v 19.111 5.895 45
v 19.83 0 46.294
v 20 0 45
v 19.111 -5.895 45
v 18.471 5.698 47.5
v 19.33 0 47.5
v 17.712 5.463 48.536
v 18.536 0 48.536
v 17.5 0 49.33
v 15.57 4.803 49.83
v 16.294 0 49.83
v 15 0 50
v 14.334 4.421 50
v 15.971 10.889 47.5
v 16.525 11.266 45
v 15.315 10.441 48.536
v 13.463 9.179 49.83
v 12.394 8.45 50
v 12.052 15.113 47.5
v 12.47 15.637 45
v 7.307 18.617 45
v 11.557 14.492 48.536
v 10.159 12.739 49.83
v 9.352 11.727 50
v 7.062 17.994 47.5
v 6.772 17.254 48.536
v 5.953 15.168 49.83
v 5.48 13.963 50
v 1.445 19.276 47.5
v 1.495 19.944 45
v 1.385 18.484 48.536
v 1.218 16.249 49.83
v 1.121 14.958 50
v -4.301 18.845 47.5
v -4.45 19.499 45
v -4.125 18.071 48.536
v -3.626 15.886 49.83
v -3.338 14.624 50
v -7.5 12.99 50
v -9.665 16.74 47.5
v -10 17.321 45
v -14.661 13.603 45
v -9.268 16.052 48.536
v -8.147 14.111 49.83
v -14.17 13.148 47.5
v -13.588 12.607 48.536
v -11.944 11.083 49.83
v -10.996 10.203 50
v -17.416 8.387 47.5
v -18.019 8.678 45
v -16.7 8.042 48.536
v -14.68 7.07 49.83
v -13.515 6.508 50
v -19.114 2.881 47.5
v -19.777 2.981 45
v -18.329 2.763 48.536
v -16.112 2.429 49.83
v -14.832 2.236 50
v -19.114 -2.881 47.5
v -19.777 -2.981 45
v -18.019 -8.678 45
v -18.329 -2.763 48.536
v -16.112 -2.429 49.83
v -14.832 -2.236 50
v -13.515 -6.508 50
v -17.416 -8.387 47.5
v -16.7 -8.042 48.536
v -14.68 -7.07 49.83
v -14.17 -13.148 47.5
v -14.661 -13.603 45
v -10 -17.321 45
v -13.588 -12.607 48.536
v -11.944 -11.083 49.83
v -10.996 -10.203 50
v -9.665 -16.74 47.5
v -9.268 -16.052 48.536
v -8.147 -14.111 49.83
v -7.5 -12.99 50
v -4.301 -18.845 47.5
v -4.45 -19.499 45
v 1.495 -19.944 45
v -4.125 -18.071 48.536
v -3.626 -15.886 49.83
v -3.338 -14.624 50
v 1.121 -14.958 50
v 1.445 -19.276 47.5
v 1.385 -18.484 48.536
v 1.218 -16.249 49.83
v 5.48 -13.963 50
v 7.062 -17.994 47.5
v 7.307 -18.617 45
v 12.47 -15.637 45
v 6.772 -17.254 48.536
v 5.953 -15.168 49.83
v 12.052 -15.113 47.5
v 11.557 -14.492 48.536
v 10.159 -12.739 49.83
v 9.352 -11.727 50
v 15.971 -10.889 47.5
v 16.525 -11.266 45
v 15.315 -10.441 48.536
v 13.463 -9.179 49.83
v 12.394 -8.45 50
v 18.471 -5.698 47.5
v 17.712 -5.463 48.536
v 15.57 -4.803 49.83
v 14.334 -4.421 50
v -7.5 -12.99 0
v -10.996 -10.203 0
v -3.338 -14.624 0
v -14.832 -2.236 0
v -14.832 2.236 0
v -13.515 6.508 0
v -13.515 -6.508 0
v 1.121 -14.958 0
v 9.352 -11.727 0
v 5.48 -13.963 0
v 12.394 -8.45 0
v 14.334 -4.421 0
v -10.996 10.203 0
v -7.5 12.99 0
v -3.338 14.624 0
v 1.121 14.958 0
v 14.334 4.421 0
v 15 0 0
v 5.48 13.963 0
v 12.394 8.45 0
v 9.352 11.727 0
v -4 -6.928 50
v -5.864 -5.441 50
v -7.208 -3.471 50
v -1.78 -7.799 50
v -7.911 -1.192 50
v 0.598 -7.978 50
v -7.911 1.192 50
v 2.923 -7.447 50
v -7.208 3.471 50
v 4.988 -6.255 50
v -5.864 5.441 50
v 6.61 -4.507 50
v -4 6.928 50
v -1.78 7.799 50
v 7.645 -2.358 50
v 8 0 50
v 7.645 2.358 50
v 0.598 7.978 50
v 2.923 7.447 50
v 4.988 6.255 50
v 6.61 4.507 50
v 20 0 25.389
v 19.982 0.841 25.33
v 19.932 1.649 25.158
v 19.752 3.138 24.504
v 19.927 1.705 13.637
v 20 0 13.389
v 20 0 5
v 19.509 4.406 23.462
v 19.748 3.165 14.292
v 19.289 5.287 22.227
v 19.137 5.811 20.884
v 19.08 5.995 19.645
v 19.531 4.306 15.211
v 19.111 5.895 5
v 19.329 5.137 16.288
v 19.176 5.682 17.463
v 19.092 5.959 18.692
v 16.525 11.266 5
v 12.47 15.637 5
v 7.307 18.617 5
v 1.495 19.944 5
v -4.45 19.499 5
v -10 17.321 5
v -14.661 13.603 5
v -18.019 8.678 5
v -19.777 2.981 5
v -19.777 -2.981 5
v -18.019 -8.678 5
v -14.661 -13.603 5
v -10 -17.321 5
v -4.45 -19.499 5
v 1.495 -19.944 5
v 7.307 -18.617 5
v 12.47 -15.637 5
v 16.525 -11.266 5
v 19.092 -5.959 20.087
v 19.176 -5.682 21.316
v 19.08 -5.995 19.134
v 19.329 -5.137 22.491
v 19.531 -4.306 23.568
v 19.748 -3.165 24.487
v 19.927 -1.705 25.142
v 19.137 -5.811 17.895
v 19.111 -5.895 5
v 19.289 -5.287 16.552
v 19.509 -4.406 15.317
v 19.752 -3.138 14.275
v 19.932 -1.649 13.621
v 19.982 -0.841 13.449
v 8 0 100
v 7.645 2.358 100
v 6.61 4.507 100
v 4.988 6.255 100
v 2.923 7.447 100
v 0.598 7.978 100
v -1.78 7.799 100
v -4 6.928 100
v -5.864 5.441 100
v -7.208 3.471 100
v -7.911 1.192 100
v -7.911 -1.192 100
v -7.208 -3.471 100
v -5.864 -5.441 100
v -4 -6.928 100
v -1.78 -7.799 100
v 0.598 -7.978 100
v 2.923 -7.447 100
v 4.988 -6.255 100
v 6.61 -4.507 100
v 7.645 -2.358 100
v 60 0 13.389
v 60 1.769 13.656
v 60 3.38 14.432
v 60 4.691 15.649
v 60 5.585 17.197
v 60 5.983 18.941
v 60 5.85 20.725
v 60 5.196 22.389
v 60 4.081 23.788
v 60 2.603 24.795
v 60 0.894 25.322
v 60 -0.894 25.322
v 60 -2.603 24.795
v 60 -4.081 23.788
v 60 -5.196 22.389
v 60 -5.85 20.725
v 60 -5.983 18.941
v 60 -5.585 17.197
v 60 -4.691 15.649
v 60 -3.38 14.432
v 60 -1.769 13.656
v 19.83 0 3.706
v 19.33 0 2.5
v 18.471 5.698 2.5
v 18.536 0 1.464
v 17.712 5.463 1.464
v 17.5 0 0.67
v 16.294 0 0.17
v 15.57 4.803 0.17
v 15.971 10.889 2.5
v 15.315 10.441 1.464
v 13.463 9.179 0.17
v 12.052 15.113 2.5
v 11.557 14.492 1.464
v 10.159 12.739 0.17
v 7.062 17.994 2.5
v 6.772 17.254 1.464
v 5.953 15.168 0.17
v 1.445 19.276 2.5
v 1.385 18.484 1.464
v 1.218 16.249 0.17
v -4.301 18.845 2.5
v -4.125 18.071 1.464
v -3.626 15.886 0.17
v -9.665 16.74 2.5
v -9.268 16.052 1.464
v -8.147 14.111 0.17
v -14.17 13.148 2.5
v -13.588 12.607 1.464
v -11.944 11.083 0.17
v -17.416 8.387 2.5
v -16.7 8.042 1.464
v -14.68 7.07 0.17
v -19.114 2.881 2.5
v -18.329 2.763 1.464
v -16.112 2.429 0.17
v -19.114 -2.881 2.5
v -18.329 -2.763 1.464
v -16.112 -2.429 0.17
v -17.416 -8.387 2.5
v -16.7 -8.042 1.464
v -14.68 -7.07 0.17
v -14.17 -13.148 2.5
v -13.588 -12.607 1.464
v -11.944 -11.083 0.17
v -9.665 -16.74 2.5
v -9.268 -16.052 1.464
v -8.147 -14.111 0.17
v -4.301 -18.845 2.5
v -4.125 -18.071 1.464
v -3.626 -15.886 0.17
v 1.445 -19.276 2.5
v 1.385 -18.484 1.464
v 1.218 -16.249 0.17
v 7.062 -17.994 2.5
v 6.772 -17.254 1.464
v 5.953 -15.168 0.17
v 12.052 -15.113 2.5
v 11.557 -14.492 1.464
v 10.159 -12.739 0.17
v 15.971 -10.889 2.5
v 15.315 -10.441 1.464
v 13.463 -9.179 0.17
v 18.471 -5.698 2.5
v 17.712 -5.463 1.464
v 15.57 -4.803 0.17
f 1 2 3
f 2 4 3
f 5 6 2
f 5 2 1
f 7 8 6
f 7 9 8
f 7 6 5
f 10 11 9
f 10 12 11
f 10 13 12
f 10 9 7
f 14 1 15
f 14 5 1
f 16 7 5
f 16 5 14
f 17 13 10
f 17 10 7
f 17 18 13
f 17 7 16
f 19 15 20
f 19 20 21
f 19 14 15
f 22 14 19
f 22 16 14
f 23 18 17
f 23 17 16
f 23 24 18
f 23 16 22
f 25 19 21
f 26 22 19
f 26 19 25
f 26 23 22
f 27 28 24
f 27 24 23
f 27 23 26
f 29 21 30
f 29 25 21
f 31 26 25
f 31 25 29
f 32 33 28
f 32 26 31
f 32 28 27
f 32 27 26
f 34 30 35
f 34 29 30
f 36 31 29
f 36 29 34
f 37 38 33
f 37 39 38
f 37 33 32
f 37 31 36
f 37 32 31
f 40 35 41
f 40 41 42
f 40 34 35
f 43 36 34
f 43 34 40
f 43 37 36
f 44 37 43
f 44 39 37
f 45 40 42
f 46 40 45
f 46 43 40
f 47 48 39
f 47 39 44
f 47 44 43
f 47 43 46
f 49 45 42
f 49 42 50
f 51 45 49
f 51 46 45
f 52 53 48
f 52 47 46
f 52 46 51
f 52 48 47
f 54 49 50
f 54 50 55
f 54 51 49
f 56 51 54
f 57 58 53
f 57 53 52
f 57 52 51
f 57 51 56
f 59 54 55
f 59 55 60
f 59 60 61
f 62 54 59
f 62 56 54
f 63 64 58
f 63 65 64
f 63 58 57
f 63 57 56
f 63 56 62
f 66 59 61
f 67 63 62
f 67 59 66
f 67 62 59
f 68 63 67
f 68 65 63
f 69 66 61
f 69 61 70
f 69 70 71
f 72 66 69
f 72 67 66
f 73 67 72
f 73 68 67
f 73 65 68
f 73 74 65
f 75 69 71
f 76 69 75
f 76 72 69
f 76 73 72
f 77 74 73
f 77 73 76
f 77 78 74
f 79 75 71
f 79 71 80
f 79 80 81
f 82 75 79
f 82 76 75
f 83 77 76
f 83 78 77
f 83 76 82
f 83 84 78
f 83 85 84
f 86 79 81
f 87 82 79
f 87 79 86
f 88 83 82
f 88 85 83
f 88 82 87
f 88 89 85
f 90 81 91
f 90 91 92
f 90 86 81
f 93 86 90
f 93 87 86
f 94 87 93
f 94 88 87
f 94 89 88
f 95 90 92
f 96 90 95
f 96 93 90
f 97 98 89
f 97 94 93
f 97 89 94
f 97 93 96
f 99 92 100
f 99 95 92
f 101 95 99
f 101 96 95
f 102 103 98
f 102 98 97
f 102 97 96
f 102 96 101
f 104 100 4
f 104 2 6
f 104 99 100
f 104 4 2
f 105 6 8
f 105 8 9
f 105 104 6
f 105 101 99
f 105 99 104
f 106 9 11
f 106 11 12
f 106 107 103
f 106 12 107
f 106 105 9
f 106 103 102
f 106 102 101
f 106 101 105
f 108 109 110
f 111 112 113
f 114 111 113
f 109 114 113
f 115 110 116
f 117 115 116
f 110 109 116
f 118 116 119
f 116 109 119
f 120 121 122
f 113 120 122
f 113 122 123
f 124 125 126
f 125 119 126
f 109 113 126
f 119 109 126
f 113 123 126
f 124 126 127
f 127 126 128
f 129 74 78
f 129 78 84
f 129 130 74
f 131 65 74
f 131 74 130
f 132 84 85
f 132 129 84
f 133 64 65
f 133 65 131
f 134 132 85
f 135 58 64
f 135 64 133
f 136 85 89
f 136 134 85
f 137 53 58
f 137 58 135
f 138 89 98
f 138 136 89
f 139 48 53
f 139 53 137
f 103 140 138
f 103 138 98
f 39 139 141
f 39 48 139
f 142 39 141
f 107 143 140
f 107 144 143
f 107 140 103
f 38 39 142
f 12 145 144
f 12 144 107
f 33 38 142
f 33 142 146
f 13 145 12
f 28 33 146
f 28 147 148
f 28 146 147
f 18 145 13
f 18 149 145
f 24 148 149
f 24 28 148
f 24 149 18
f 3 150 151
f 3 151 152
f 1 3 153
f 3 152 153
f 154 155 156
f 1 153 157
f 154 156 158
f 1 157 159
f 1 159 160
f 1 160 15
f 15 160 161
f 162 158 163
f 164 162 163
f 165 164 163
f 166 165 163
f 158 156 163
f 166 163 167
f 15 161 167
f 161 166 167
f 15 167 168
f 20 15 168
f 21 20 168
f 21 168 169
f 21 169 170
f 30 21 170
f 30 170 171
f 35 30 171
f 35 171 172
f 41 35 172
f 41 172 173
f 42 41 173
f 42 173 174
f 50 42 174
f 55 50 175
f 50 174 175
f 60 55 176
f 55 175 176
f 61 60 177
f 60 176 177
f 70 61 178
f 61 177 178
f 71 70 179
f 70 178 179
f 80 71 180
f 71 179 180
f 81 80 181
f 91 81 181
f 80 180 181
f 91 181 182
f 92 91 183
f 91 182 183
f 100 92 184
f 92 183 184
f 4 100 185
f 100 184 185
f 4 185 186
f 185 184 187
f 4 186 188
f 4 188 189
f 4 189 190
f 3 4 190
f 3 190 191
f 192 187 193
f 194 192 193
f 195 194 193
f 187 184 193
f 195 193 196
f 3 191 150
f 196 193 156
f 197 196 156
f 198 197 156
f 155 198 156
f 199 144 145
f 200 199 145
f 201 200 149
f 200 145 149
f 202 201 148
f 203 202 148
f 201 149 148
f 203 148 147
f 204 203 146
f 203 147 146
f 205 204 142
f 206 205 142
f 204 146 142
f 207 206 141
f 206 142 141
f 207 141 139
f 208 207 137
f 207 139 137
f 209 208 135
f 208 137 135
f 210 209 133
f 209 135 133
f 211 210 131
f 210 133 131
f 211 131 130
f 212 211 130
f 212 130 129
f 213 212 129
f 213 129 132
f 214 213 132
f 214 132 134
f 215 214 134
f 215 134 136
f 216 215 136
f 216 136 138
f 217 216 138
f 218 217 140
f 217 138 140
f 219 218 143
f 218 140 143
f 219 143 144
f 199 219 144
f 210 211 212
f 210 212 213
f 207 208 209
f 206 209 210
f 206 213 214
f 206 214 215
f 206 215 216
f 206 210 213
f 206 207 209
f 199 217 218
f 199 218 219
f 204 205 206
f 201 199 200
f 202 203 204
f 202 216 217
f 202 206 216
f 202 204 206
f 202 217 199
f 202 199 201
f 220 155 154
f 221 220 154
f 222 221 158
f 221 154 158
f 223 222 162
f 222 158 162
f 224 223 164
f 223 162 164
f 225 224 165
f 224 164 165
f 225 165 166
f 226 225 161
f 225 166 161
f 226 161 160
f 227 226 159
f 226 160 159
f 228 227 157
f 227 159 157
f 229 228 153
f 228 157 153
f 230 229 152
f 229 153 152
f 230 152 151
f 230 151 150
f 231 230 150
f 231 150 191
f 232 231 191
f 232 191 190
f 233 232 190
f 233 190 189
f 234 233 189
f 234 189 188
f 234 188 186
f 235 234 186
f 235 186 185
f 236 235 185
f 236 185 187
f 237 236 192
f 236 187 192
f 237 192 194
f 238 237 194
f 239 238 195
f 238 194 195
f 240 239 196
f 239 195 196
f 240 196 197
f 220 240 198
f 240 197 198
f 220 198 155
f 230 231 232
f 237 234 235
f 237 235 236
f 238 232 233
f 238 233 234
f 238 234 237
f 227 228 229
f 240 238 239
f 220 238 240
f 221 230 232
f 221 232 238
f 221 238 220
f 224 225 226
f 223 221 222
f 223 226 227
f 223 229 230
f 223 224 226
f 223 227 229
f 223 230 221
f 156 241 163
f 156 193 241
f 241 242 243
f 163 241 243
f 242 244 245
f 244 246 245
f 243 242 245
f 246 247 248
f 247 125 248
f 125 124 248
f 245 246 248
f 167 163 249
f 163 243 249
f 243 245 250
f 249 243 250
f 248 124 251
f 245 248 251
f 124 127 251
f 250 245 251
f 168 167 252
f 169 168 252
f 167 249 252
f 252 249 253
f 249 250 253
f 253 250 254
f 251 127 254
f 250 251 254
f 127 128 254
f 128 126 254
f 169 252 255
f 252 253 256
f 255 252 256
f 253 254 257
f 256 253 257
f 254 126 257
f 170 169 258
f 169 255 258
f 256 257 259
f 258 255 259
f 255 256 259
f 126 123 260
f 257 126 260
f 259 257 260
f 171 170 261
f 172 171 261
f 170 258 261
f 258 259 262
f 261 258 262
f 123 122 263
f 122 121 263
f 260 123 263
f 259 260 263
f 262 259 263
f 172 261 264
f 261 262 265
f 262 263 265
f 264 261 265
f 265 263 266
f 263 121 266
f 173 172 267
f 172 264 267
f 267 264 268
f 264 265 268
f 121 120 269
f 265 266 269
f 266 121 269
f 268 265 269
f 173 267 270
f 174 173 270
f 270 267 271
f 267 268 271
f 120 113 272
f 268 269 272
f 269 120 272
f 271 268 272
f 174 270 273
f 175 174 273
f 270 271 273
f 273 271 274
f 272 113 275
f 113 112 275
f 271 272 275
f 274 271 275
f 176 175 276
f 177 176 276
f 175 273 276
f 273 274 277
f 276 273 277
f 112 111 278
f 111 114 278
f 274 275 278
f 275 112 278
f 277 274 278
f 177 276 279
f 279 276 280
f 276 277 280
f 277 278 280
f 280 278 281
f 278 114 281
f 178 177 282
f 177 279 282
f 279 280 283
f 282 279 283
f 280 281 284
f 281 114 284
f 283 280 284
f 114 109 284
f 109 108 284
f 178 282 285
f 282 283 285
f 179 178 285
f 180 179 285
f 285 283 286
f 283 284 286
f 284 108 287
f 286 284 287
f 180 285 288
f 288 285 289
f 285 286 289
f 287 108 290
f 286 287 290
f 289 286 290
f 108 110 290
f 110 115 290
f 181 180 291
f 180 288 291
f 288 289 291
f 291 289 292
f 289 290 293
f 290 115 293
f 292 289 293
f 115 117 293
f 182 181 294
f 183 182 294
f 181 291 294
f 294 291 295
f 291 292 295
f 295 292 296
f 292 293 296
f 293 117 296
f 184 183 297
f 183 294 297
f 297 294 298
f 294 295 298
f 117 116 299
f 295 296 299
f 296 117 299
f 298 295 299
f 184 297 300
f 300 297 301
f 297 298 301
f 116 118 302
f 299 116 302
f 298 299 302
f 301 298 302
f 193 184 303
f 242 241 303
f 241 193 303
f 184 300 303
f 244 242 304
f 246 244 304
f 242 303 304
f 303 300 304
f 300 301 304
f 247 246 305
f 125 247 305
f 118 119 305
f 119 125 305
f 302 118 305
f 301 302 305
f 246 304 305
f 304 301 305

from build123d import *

# Parameters (mm, degrees)
SZKIC1_R                    = 20
DODANIE_WYCI_GNI_CIE1_DEPTH = 50
ZAOKR_GLENIE1_R             = 5
SZKIC2_R                    = 8
DODANIE_WYCI_GNI_CIE2_DEPTH = 50
SZKIC3_R                    = 6
DODANIE_WYCI_GNI_CIE3_DEPTH = 60


with BuildPart() as part:
    # Szkic1 → Dodanie-wyciągnięcie1 (new body)
    with BuildSketch(Plane.XY):
        Circle(SZKIC1_R)
    extrude(amount=DODANIE_WYCI_GNI_CIE1_DEPTH)

    # Zaokrąglenie1
    zaokr_glenie1_edges = [part.edges().sort_by_distance(p)[0] for p in [
        (-20, 0, 0),
        (-20, 0, 50),
    ]]
    fillet(zaokr_glenie1_edges, radius=ZAOKR_GLENIE1_R)

    # Szkic2 → Dodanie-wyciągnięcie2 (add)
    with BuildSketch(Plane.XY.offset(50)):
        Circle(SZKIC2_R)
    extrude(amount=DODANIE_WYCI_GNI_CIE2_DEPTH)

    # Szkic3 → Dodanie-wyciągnięcie3 (add)
    with BuildSketch(Plane(origin=(0, 0, 0), x_dir=(0, 0, -1), z_dir=(1, 0, 0))):
        with Locations((-19.389494998, 0)):
            Circle(SZKIC3_R)
    extrude(amount=DODANIE_WYCI_GNI_CIE3_DEPTH)


solid = part.part
